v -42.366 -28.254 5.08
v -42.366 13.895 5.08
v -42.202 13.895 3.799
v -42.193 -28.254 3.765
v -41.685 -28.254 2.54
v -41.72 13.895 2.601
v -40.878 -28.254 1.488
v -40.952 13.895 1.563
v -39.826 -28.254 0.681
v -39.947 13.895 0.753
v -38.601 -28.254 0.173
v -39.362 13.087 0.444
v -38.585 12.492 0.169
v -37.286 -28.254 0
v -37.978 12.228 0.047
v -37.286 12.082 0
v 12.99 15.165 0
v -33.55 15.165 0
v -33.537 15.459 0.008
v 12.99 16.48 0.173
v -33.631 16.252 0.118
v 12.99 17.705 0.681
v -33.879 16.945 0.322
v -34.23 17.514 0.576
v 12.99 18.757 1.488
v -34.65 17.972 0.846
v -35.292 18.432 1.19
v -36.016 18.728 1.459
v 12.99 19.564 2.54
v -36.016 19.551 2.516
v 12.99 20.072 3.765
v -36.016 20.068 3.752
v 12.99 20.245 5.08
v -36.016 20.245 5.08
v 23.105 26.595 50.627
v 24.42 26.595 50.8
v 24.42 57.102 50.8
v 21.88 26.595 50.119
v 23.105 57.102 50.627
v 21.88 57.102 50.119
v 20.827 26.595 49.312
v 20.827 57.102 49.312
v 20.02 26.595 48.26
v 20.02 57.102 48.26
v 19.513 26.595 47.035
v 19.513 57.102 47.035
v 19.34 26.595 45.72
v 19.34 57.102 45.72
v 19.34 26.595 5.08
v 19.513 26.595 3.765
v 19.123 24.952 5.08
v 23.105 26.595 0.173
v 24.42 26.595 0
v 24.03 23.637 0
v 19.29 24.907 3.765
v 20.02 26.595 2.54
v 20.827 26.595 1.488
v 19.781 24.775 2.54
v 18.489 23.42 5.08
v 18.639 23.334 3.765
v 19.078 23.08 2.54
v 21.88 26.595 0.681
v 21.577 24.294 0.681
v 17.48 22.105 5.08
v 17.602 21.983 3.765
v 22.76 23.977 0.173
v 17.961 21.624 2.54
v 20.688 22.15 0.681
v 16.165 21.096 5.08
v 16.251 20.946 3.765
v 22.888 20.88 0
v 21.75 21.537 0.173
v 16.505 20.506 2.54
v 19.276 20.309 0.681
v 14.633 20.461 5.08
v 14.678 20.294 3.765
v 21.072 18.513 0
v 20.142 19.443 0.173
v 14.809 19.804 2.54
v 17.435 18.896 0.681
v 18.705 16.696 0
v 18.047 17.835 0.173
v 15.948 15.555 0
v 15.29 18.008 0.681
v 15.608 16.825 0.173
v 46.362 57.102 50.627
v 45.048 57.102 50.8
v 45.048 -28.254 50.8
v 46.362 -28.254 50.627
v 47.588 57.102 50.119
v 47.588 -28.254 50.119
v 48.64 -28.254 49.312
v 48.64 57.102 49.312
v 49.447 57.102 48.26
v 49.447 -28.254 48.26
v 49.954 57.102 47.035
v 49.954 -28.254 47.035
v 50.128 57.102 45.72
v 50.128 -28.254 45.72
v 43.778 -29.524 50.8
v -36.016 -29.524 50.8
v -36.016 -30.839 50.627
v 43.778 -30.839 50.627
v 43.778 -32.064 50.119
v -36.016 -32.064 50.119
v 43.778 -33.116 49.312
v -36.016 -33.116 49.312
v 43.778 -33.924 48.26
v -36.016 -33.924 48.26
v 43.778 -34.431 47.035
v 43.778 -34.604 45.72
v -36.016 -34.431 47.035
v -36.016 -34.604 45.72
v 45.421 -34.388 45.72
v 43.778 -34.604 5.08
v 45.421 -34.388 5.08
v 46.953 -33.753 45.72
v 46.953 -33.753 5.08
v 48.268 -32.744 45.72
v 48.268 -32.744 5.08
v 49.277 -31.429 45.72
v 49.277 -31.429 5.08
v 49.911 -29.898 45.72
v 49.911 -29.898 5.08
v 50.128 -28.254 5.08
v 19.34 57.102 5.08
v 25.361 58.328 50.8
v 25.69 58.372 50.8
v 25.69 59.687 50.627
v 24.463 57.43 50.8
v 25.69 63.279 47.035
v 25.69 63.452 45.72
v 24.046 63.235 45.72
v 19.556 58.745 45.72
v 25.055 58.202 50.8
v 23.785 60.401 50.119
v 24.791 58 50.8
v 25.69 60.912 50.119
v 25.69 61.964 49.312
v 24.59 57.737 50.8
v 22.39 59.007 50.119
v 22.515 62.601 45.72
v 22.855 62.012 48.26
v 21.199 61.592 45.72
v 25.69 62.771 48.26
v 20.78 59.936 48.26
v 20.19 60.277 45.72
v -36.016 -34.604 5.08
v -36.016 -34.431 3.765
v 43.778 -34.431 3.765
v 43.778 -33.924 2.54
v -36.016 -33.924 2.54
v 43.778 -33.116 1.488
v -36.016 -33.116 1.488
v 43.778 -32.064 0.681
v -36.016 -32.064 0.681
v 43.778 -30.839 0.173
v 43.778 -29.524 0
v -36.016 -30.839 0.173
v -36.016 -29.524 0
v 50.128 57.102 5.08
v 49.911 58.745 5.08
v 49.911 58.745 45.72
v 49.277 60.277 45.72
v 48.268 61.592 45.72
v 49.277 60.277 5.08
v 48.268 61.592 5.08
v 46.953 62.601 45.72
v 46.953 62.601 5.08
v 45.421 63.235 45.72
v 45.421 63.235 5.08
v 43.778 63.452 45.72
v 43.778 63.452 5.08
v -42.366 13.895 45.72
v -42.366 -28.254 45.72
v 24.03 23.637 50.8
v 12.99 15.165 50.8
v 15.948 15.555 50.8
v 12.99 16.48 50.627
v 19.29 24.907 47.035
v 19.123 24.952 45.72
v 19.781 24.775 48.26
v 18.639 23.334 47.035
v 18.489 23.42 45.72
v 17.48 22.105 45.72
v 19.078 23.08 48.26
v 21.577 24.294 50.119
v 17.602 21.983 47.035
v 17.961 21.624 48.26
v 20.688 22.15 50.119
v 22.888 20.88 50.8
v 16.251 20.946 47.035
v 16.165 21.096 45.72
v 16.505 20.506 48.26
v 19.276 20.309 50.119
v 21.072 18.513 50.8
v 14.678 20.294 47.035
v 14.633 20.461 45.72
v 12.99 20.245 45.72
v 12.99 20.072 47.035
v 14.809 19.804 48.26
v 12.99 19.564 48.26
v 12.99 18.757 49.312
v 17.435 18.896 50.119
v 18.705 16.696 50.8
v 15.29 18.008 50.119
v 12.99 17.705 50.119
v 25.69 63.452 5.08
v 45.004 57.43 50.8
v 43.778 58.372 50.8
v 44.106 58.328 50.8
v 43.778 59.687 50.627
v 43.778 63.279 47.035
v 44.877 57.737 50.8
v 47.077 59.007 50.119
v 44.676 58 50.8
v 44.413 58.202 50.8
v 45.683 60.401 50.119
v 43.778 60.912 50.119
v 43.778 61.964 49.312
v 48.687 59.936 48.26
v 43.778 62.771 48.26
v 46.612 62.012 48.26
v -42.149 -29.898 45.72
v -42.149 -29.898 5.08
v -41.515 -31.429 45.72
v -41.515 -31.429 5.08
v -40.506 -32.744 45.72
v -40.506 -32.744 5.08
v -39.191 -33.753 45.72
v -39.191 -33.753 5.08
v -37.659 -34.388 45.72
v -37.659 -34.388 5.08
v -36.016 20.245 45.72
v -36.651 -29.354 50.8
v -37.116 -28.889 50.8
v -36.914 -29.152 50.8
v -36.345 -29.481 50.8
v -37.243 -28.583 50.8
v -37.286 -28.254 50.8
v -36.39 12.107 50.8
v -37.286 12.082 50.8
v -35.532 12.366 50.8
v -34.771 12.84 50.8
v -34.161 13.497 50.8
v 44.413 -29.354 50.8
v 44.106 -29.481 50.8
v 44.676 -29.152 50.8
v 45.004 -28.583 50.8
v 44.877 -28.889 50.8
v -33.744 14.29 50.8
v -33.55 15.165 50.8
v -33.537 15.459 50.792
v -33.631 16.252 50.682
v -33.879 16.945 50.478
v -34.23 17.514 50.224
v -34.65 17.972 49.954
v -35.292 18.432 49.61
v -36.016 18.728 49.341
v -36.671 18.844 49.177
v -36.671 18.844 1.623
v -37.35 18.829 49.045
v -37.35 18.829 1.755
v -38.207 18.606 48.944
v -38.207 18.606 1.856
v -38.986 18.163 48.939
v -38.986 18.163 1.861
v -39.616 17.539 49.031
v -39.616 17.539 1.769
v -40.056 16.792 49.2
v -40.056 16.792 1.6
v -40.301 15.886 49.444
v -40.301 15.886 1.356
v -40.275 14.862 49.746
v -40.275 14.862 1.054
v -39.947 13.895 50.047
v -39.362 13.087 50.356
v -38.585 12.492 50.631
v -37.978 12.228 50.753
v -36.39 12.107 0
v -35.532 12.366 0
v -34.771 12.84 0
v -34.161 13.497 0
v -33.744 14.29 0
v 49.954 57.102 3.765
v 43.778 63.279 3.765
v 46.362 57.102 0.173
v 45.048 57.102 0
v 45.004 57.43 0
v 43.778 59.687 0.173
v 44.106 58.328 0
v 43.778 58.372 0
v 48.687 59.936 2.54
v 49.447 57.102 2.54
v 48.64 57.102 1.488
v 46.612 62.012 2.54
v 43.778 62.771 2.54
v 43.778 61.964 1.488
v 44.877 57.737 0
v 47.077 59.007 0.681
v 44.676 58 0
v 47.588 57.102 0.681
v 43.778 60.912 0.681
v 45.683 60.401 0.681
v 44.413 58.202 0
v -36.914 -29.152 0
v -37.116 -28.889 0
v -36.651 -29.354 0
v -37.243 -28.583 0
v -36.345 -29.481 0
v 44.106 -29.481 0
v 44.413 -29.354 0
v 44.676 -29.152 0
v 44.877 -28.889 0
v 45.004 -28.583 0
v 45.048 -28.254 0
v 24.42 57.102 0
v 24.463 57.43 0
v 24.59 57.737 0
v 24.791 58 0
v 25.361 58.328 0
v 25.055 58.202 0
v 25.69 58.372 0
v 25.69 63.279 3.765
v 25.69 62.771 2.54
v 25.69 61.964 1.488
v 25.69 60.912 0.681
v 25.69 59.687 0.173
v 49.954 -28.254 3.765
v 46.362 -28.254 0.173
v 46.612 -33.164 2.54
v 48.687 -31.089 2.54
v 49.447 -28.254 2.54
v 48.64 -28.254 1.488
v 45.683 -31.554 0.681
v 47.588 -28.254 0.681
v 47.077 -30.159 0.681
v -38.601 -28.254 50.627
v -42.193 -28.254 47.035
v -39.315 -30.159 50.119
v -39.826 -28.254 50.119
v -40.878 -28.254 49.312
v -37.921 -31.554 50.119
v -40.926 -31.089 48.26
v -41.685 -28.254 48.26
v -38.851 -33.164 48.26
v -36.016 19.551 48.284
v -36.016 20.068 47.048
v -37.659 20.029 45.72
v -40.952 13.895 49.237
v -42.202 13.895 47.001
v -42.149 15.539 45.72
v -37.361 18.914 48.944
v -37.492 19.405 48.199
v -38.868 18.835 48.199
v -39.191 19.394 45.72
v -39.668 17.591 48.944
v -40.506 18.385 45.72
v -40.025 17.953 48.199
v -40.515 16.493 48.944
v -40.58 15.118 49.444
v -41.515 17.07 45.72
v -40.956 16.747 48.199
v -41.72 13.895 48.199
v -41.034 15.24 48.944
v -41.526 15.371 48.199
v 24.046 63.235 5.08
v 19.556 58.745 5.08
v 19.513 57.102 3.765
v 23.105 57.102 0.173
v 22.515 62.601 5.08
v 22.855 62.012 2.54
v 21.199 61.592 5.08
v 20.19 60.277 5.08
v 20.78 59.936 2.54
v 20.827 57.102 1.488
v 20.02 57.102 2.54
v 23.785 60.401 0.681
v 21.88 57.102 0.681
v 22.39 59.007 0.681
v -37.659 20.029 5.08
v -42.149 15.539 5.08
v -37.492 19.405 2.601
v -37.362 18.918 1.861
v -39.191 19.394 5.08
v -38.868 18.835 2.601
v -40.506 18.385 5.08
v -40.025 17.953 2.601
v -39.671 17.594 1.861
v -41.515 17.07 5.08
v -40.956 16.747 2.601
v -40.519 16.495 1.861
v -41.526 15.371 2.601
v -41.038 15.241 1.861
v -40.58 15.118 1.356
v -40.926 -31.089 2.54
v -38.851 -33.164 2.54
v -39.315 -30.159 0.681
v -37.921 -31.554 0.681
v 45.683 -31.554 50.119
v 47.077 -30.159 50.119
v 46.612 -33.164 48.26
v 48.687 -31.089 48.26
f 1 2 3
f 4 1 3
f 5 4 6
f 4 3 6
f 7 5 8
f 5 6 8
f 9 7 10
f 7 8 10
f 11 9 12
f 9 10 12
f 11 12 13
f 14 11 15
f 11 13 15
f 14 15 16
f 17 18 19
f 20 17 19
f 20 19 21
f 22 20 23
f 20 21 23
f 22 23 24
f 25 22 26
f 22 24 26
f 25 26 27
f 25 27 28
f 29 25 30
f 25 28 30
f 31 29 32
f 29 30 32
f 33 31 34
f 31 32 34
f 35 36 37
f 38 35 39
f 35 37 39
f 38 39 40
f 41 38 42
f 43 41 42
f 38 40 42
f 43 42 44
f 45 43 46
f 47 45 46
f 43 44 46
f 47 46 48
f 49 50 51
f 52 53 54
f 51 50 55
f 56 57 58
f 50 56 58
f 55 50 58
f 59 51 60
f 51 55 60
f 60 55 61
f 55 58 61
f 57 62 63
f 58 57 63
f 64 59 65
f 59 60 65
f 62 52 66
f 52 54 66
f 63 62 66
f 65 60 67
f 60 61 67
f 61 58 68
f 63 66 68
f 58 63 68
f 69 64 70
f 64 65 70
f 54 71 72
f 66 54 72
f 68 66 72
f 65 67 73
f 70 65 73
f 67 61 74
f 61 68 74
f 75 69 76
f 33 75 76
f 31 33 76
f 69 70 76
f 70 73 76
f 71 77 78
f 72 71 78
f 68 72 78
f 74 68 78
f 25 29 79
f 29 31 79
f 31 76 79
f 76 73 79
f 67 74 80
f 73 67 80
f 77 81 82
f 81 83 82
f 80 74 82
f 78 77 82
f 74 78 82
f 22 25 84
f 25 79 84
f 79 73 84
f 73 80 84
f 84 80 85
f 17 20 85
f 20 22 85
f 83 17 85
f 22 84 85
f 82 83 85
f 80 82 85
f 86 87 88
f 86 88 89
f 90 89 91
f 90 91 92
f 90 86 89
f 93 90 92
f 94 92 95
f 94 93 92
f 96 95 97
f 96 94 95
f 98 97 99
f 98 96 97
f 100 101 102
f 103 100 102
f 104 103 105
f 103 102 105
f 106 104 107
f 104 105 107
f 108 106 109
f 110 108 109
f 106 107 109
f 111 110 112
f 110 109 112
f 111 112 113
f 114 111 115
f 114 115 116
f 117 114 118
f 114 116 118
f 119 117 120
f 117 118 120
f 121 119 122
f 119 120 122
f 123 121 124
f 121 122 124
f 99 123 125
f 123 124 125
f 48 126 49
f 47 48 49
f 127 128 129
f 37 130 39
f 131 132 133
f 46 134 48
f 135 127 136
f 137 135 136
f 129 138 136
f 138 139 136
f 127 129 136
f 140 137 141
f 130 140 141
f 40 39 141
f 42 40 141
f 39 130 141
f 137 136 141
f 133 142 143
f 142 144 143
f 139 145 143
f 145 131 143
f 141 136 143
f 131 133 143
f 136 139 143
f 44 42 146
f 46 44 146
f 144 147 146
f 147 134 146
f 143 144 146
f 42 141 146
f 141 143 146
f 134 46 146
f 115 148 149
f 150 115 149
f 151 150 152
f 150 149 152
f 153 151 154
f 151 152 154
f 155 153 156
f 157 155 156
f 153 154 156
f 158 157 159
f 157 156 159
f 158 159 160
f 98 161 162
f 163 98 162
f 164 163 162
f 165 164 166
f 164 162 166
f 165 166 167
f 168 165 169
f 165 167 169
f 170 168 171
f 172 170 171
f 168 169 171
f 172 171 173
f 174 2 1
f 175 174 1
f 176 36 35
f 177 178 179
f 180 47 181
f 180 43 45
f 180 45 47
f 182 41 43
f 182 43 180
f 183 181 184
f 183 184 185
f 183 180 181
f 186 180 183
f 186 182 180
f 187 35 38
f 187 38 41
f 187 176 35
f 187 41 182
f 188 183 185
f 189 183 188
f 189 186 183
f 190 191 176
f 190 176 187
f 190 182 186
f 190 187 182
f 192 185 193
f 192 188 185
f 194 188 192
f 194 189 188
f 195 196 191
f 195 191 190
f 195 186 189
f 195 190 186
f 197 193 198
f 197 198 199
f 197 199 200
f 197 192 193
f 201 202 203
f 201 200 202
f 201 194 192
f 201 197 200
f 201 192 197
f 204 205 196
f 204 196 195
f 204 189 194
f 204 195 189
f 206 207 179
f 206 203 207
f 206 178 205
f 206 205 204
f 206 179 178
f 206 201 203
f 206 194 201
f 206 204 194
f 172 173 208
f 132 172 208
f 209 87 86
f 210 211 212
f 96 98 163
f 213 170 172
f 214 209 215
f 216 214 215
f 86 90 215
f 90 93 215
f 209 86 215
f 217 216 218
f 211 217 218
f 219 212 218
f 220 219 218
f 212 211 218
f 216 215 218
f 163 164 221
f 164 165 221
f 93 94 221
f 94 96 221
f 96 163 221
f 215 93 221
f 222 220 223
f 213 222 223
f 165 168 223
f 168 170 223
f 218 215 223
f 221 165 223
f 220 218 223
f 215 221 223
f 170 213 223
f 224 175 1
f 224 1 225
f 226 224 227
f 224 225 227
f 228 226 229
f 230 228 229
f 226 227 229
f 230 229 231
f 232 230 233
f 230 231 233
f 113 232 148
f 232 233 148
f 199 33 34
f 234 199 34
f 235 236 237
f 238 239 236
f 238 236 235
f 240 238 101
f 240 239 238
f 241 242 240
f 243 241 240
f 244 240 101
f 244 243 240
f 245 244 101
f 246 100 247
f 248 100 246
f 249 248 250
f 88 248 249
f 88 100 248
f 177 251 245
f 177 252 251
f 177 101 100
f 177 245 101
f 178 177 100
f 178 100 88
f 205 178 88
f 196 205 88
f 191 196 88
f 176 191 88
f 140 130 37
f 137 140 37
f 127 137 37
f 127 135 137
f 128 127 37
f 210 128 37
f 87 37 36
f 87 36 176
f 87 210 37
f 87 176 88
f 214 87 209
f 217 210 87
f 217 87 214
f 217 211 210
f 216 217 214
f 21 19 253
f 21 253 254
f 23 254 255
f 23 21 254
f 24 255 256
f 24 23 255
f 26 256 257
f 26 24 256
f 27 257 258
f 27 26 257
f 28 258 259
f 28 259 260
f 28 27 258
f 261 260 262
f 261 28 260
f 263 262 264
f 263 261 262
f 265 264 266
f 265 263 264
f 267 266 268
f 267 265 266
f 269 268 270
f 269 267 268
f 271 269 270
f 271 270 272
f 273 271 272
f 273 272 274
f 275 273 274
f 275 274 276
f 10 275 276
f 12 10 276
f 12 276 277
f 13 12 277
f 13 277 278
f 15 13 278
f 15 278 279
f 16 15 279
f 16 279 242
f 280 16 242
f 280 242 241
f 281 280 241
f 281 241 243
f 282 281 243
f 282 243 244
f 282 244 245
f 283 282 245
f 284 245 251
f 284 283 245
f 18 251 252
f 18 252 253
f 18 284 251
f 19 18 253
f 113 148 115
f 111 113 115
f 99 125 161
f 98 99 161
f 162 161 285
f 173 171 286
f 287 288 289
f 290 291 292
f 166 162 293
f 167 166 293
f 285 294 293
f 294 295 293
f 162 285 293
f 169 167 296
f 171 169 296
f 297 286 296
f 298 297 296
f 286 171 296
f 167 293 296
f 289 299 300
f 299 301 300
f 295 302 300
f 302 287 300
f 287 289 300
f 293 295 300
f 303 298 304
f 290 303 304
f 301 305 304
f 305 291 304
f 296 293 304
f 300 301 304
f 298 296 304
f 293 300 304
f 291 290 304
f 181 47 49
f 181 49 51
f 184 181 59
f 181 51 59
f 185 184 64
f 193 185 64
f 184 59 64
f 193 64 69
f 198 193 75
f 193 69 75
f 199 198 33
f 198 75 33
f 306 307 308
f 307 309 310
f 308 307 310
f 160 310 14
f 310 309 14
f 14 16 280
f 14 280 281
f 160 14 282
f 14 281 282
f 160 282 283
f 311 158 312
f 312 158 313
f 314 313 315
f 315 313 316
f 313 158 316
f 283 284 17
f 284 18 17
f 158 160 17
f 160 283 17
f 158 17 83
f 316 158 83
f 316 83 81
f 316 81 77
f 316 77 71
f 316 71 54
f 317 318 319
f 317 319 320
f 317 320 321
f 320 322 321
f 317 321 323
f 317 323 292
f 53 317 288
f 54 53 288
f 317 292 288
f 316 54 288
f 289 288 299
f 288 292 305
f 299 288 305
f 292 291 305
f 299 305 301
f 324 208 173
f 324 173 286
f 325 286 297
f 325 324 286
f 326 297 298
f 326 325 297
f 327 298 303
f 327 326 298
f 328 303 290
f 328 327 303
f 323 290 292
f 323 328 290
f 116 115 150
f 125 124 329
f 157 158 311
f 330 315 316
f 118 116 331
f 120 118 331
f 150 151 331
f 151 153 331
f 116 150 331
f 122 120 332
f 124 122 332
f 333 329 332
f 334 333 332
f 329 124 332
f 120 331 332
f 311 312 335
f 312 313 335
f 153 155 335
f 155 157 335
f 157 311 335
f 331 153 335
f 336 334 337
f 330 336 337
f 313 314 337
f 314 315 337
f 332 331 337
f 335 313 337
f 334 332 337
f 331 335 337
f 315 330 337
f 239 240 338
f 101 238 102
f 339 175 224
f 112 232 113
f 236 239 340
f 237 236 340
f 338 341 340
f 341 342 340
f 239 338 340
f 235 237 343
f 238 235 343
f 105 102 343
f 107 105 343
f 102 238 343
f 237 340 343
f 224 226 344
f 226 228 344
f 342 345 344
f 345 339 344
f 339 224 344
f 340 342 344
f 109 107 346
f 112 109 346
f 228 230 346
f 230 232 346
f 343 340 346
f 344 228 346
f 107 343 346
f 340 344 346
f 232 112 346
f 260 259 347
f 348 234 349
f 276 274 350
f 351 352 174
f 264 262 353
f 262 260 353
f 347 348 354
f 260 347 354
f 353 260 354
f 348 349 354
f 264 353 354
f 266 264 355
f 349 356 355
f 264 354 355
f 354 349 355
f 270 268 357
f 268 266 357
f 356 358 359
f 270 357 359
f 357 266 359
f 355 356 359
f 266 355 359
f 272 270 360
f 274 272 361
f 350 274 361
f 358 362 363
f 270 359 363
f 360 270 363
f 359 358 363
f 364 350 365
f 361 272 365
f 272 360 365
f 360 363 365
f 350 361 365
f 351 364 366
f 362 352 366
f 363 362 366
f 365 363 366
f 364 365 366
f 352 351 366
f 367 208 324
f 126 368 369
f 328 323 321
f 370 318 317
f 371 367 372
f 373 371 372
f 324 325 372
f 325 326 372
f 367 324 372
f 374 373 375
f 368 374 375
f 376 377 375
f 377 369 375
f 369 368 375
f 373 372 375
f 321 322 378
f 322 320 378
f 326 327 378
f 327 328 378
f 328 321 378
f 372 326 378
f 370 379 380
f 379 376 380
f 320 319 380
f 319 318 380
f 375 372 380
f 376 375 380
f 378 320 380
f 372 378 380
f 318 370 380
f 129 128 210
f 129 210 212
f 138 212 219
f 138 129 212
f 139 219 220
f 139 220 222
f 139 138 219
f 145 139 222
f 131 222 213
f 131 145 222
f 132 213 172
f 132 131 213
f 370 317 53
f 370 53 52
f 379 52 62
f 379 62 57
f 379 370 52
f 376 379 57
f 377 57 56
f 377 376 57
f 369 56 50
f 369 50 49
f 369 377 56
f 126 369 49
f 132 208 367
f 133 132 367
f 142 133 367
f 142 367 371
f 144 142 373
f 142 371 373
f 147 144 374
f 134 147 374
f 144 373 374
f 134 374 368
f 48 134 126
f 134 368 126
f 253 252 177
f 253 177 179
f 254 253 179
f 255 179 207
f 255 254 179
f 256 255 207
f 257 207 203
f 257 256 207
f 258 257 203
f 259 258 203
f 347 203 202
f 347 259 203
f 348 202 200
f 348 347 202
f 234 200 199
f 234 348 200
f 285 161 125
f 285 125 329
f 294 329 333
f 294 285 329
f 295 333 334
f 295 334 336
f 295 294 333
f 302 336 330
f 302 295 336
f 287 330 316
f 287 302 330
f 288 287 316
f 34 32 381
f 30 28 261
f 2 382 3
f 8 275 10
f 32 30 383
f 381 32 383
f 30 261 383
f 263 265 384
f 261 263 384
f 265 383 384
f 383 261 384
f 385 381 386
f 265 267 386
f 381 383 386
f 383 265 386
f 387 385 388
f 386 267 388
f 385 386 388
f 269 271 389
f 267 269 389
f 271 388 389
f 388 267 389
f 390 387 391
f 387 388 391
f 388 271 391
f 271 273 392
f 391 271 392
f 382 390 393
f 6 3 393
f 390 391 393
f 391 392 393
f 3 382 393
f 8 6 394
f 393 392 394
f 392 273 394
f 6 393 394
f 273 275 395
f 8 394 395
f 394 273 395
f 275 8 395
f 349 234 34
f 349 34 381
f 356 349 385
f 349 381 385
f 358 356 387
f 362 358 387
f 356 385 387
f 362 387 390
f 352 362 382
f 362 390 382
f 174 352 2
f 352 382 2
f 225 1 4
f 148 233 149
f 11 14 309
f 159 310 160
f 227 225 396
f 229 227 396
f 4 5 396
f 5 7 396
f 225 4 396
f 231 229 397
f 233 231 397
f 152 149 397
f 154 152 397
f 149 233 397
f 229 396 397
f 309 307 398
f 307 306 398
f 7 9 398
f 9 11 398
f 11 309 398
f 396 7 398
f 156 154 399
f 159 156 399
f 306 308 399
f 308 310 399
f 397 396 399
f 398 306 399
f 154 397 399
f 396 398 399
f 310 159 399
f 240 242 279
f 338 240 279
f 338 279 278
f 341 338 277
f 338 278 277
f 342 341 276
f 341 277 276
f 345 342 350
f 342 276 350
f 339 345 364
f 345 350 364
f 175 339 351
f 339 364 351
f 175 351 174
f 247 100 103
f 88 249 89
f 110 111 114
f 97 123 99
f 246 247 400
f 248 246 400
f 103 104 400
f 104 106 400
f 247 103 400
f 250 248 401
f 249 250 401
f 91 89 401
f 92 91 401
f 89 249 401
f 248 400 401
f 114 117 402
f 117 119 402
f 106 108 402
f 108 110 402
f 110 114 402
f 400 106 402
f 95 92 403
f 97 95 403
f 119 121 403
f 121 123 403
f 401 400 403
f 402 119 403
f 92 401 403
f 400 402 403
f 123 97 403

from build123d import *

# Parameters (mm, degrees)
F0_R         = 3.3955807327
F1_DEPTH     = 50.8
F2_T1_DEPTH  = 79.7933701754
F2_T3_DEPTH  = 85.3559065938
F2_T5_DEPTH  = 18.0880006731
F2_T7_DEPTH  = 30.5066917419
F2_T9_DEPTH  = 49.0053695023
F2_T11_DEPTH = 42.1492148519
F2_T14_ANGLE = 90
F2_T16_ANGLE = 90
F2_T18_ANGLE = 90
F2_T20_ANGLE = 90
F2_T22_ANGLE = 90
F2_T24_ANGLE = 90
F2_T26_ANGLE = 90
F2_T28_ANGLE = 90
F2_T30_ANGLE = 90
F2_T32_ANGLE = 90
F2_T34_ANGLE = 90
F2_T36_ANGLE = 90


# Not quite as in the source:
# - a fillet or chamfer that OpenCascade refuses, or shapes differently, is made with other operations: its cross-section is extruded or revolved along the edge and cut away or added


with BuildPart() as f1:
    # F0 (on Top) → F1 (new body)
    with BuildSketch(Plane.XY):
        with BuildLine():
            Line((12.9895242095, 20.2450528741), (-36.0158452928, 20.2450528741))
            ThreePointArc((-36.0158452928, 20.2450528741), (-40.5059733533, 18.3851809346), (-42.3658452928, 13.8950528741))
            Line((-42.3658452928, 13.8950528741), (-42.3658452928, -28.2541619778))
            ThreePointArc((-42.3658452928, -28.2541619778), (-40.5059733533, -32.7442900383), (-36.0158452928, -34.6041619778))
            Line((-36.0158452928, -34.6041619778), (43.7775248826, -34.6041619778))
            ThreePointArc((43.7775248826, -34.6041619778), (48.2676529431, -32.7442900383), (50.1275248826, -28.2541619778))
            Line((50.1275248826, -28.2541619778), (50.1275248826, 20.2450528741))
            Line((50.1275248826, 20.2450528741), (50.1275248826, 57.101744616))
            ThreePointArc((50.1275248826, 57.101744616), (48.2676529431, 61.5918726766), (43.7775248826, 63.451744616))
            Line((43.7775248826, 63.451744616), (25.6895242095, 63.451744616))
            ThreePointArc((25.6895242095, 63.451744616), (21.199396149, 61.5918726766), (19.3395242095, 57.101744616))
            Line((19.3395242095, 57.101744616), (19.3395242095, 26.5950528741))
            ThreePointArc((19.3395242095, 26.5950528741), (17.47965227, 22.1049248136), (12.9895242095, 20.2450528741))
        make_face()
        with Locations((-36.93266958, 15.458682552)):
            Circle(F0_R, mode=Mode.SUBTRACT)
    extrude(amount=F1_DEPTH)

    # F2: fillet of radius 5.08 on 2 edges, made by hand

    # F2_s2 → F2_t1 (cut)
    with BuildSketch(Plane.YZ.offset(-36.0158452928)):
        with BuildLine():
            ThreePointArc((-29.5241619778, 50.8), (-33.1162644262, 49.3121024484), (-34.6041619778, 45.72))
            Line((-34.6041619778, 45.72), (-34.6041619778, 50.8))
            Line((-34.6041619778, 50.8), (-29.5241619778, 50.8))
        make_face()
        with BuildLine():
            ThreePointArc((-34.6041619778, 5.08), (-33.1162644262, 1.4878975516), (-29.5241619778, 0))
            Line((-29.5241619778, 0), (-34.6041619778, 0))
            Line((-34.6041619778, 0), (-34.6041619778, 5.08))
        make_face()
    extrude(amount=F2_T1_DEPTH, mode=Mode.SUBTRACT)

    # F2_s4 → F2_t3 (cut)
    with BuildSketch(Plane.XZ.offset(-57.101744616)):
        with BuildLine():
            ThreePointArc((50.1275248826, 5.08), (48.639627331, 1.4878975516), (45.0475248826, 0))
            Line((45.0475248826, 0), (50.1275248826, 0))
            Line((50.1275248826, 0), (50.1275248826, 5.08))
        make_face()
        with BuildLine():
            ThreePointArc((45.0475248826, 50.8), (48.639627331, 49.3121024484), (50.1275248826, 45.72))
            Line((50.1275248826, 45.72), (50.1275248826, 50.8))
            Line((50.1275248826, 50.8), (45.0475248826, 50.8))
        make_face()
    extrude(amount=F2_T3_DEPTH, mode=Mode.SUBTRACT)

    # F2_s6 → F2_t5 (cut)
    with BuildSketch(Plane.YZ.offset(25.6895242095)):
        with BuildLine():
            ThreePointArc((63.451744616, 5.08), (61.9638470645, 1.4878975516), (58.371744616, 0))
            Line((58.371744616, 0), (63.451744616, 0))
            Line((63.451744616, 0), (63.451744616, 5.08))
        make_face()
        with BuildLine():
            ThreePointArc((58.371744616, 50.8), (61.9638470645, 49.3121024484), (63.451744616, 45.72))
            Line((63.451744616, 45.72), (63.451744616, 50.8))
            Line((63.451744616, 50.8), (58.371744616, 50.8))
        make_face()
    extrude(amount=F2_T5_DEPTH, mode=Mode.SUBTRACT)

    # F2_s8 → F2_t7 (cut)
    with BuildSketch(Plane.XZ.offset(-57.101744616)):
        with BuildLine():
            ThreePointArc((24.4195242095, 0), (20.8274217611, 1.4878975516), (19.3395242095, 5.08))
            Line((19.3395242095, 5.08), (19.3395242095, 0))
            Line((19.3395242095, 0), (24.4195242095, 0))
        make_face()
        with BuildLine():
            ThreePointArc((24.4195242095, 50.8), (20.8274217611, 49.3121024484), (19.3395242095, 45.72))
            Line((19.3395242095, 45.72), (19.3395242095, 50.8))
            Line((19.3395242095, 50.8), (24.4195242095, 50.8))
        make_face()
    extrude(amount=F2_T7_DEPTH, mode=Mode.SUBTRACT)

    # F2_s10 → F2_t9 (cut)
    with BuildSketch(Plane.YZ.offset(-36.0158452928)):
        with BuildLine():
            ThreePointArc((15.1650528741, 0), (18.7571553225, 1.4878975516), (20.2450528741, 5.08))
            Line((20.2450528741, 5.08), (20.2450528741, 0))
            Line((20.2450528741, 0), (15.1650528741, 0))
        make_face()
        with BuildLine():
            ThreePointArc((15.1650528741, 50.8), (18.7571553225, 49.3121024484), (20.2450528741, 45.72))
            Line((20.2450528741, 45.72), (20.2450528741, 50.8))
            Line((20.2450528741, 50.8), (15.1650528741, 50.8))
        make_face()
    extrude(amount=F2_T9_DEPTH, mode=Mode.SUBTRACT)

    # F2_s12 → F2_t11 (cut)
    with BuildSketch(Plane.XZ.offset(-13.8950528741)):
        with BuildLine():
            ThreePointArc((-42.3658452928, 5.08), (-40.8779477412, 1.4878975516), (-37.2858452928, 0))
            Line((-37.2858452928, 0), (-42.3658452928, 0))
            Line((-42.3658452928, 0), (-42.3658452928, 5.08))
        make_face()
        with BuildLine():
            ThreePointArc((-37.2858452928, 50.8), (-40.8779477412, 49.3121024484), (-42.3658452928, 45.72))
            Line((-42.3658452928, 45.72), (-42.3658452928, 50.8))
            Line((-42.3658452928, 50.8), (-37.2858452928, 50.8))
        make_face()
    extrude(amount=F2_T11_DEPTH, mode=Mode.SUBTRACT)

    # F2_s13 → F2_t14 (revolve, cut)
    with BuildSketch(Plane.XZ.offset(28.2541619778)):
        with BuildLine():
            ThreePointArc((-42.3658452928, 5.08), (-40.8779477412, 1.4878975516), (-37.2858452928, 0))
            Line((-37.2858452928, 0), (-42.3658452928, 0))
            Line((-42.3658452928, 0), (-42.3658452928, 5.08))
        make_face()
    revolve(axis=Axis((-36.0158452928, -28.2541619778, 0), (0, 0, 1)), revolution_arc=F2_T14_ANGLE, mode=Mode.SUBTRACT)

    # F2_s15 → F2_t16 (revolve, cut)
    with BuildSketch(Plane.YZ.offset(43.7775248826)):
        with BuildLine():
            ThreePointArc((-34.6041619778, 5.08), (-33.1162644262, 1.4878975516), (-29.5241619778, 0))
            Line((-29.5241619778, 0), (-34.6041619778, 0))
            Line((-34.6041619778, 0), (-34.6041619778, 5.08))
        make_face()
    revolve(axis=Axis((43.7775248826, -28.2541619778, 0), (0, 0, 1)), revolution_arc=F2_T16_ANGLE, mode=Mode.SUBTRACT)

    # F2_s17 → F2_t18 (revolve, cut)
    with BuildSketch(Plane.XZ.offset(-57.101744616)):
        with BuildLine():
            ThreePointArc((50.1275248826, 5.08), (48.639627331, 1.4878975516), (45.0475248826, 0))
            Line((45.0475248826, 0), (50.1275248826, 0))
            Line((50.1275248826, 0), (50.1275248826, 5.08))
        make_face()
    revolve(axis=Axis((43.7775248826, 57.101744616, 0), (0, 0, 1)), revolution_arc=F2_T18_ANGLE, mode=Mode.SUBTRACT)

    # F2_s19 → F2_t20 (revolve, cut)
    with BuildSketch(Plane.YZ.offset(25.6895242095)):
        with BuildLine():
            ThreePointArc((63.451744616, 5.08), (61.9638470645, 1.4878975516), (58.371744616, 0))
            Line((58.371744616, 0), (63.451744616, 0))
            Line((63.451744616, 0), (63.451744616, 5.08))
        make_face()
    revolve(axis=Axis((25.6895242095, 57.101744616, 0), (0, 0, 1)), revolution_arc=F2_T20_ANGLE, mode=Mode.SUBTRACT)

    # F2_s21 → F2_t22 (revolve, cut)
    with BuildSketch(Plane.XZ.offset(-26.5950528741)):
        with BuildLine():
            ThreePointArc((19.3395242095, 5.08), (20.8274217611, 1.4878975516), (24.4195242095, 0))
            Line((24.4195242095, 0), (19.3395242095, 0))
            Line((19.3395242095, 0), (19.3395242095, 5.08))
        make_face()
    revolve(axis=Axis((12.9895242095, 26.5950528741, 0), (0, 0, -1)), revolution_arc=F2_T22_ANGLE, mode=Mode.SUBTRACT)

    # F2_s23 → F2_t24 (revolve, cut)
    with BuildSketch(Plane.YZ.offset(-36.0158452928)):
        with BuildLine():
            ThreePointArc((20.2450528741, 5.08), (18.7571553225, 1.4878975516), (15.1650528741, 0))
            Line((15.1650528741, 0), (20.2450528741, 0))
            Line((20.2450528741, 0), (20.2450528741, 5.08))
        make_face()
    revolve(axis=Axis((-36.0158452928, 13.8950528741, 0), (0, 0, 1)), revolution_arc=F2_T24_ANGLE, mode=Mode.SUBTRACT)

    # F2_s25 → F2_t26 (revolve, cut)
    with BuildSketch(Plane.XZ.offset(28.2541619778)):
        with BuildLine():
            ThreePointArc((-37.2858452928, 50.8), (-40.8779477412, 49.3121024484), (-42.3658452928, 45.72))
            Line((-42.3658452928, 45.72), (-42.3658452928, 50.8))
            Line((-42.3658452928, 50.8), (-37.2858452928, 50.8))
        make_face()
    revolve(axis=Axis((-36.0158452928, -28.2541619778, 50.8), (0, 0, 1)), revolution_arc=F2_T26_ANGLE, mode=Mode.SUBTRACT)

    # F2_s27 → F2_t28 (revolve, cut)
    with BuildSketch(Plane.YZ.offset(43.7775248826)):
        with BuildLine():
            ThreePointArc((-29.5241619778, 50.8), (-33.1162644262, 49.3121024484), (-34.6041619778, 45.72))
            Line((-34.6041619778, 45.72), (-34.6041619778, 50.8))
            Line((-34.6041619778, 50.8), (-29.5241619778, 50.8))
        make_face()
    revolve(axis=Axis((43.7775248826, -28.2541619778, 50.8), (0, 0, 1)), revolution_arc=F2_T28_ANGLE, mode=Mode.SUBTRACT)

    # F2_s29 → F2_t30 (revolve, cut)
    with BuildSketch(Plane.XZ.offset(-57.101744616)):
        with BuildLine():
            ThreePointArc((45.0475248826, 50.8), (48.639627331, 49.3121024484), (50.1275248826, 45.72))
            Line((50.1275248826, 45.72), (50.1275248826, 50.8))
            Line((50.1275248826, 50.8), (45.0475248826, 50.8))
        make_face()
    revolve(axis=Axis((43.7775248826, 57.101744616, 50.8), (0, 0, 1)), revolution_arc=F2_T30_ANGLE, mode=Mode.SUBTRACT)

    # F2_s31 → F2_t32 (revolve, cut)
    with BuildSketch(Plane.YZ.offset(25.6895242095)):
        with BuildLine():
            ThreePointArc((58.371744616, 50.8), (61.9638470645, 49.3121024484), (63.451744616, 45.72))
            Line((63.451744616, 45.72), (63.451744616, 50.8))
            Line((63.451744616, 50.8), (58.371744616, 50.8))
        make_face()
    revolve(axis=Axis((25.6895242095, 57.101744616, 50.8), (0, 0, 1)), revolution_arc=F2_T32_ANGLE, mode=Mode.SUBTRACT)

    # F2_s33 → F2_t34 (revolve, cut)
    with BuildSketch(Plane.XZ.offset(-26.5950528741)):
        with BuildLine():
            ThreePointArc((19.3395242095, 45.72), (20.8274217611, 49.3121024484), (24.4195242095, 50.8))
            Line((24.4195242095, 50.8), (19.3395242095, 50.8))
            Line((19.3395242095, 50.8), (19.3395242095, 45.72))
        make_face()
    revolve(axis=Axis((12.9895242095, 26.5950528741, 50.8), (0, 0, -1)), revolution_arc=F2_T34_ANGLE, mode=Mode.SUBTRACT)

    # F2_s35 → F2_t36 (revolve, cut)
    with BuildSketch(Plane.YZ.offset(-36.0158452928)):
        with BuildLine():
            ThreePointArc((15.1650528741, 50.8), (18.7571553225, 49.3121024484), (20.2450528741, 45.72))
            Line((20.2450528741, 45.72), (20.2450528741, 50.8))
            Line((20.2450528741, 50.8), (15.1650528741, 50.8))
        make_face()
    revolve(axis=Axis((-36.0158452928, 13.8950528741, 50.8), (0, 0, 1)), revolution_arc=F2_T36_ANGLE, mode=Mode.SUBTRACT)


solid = f1.part
